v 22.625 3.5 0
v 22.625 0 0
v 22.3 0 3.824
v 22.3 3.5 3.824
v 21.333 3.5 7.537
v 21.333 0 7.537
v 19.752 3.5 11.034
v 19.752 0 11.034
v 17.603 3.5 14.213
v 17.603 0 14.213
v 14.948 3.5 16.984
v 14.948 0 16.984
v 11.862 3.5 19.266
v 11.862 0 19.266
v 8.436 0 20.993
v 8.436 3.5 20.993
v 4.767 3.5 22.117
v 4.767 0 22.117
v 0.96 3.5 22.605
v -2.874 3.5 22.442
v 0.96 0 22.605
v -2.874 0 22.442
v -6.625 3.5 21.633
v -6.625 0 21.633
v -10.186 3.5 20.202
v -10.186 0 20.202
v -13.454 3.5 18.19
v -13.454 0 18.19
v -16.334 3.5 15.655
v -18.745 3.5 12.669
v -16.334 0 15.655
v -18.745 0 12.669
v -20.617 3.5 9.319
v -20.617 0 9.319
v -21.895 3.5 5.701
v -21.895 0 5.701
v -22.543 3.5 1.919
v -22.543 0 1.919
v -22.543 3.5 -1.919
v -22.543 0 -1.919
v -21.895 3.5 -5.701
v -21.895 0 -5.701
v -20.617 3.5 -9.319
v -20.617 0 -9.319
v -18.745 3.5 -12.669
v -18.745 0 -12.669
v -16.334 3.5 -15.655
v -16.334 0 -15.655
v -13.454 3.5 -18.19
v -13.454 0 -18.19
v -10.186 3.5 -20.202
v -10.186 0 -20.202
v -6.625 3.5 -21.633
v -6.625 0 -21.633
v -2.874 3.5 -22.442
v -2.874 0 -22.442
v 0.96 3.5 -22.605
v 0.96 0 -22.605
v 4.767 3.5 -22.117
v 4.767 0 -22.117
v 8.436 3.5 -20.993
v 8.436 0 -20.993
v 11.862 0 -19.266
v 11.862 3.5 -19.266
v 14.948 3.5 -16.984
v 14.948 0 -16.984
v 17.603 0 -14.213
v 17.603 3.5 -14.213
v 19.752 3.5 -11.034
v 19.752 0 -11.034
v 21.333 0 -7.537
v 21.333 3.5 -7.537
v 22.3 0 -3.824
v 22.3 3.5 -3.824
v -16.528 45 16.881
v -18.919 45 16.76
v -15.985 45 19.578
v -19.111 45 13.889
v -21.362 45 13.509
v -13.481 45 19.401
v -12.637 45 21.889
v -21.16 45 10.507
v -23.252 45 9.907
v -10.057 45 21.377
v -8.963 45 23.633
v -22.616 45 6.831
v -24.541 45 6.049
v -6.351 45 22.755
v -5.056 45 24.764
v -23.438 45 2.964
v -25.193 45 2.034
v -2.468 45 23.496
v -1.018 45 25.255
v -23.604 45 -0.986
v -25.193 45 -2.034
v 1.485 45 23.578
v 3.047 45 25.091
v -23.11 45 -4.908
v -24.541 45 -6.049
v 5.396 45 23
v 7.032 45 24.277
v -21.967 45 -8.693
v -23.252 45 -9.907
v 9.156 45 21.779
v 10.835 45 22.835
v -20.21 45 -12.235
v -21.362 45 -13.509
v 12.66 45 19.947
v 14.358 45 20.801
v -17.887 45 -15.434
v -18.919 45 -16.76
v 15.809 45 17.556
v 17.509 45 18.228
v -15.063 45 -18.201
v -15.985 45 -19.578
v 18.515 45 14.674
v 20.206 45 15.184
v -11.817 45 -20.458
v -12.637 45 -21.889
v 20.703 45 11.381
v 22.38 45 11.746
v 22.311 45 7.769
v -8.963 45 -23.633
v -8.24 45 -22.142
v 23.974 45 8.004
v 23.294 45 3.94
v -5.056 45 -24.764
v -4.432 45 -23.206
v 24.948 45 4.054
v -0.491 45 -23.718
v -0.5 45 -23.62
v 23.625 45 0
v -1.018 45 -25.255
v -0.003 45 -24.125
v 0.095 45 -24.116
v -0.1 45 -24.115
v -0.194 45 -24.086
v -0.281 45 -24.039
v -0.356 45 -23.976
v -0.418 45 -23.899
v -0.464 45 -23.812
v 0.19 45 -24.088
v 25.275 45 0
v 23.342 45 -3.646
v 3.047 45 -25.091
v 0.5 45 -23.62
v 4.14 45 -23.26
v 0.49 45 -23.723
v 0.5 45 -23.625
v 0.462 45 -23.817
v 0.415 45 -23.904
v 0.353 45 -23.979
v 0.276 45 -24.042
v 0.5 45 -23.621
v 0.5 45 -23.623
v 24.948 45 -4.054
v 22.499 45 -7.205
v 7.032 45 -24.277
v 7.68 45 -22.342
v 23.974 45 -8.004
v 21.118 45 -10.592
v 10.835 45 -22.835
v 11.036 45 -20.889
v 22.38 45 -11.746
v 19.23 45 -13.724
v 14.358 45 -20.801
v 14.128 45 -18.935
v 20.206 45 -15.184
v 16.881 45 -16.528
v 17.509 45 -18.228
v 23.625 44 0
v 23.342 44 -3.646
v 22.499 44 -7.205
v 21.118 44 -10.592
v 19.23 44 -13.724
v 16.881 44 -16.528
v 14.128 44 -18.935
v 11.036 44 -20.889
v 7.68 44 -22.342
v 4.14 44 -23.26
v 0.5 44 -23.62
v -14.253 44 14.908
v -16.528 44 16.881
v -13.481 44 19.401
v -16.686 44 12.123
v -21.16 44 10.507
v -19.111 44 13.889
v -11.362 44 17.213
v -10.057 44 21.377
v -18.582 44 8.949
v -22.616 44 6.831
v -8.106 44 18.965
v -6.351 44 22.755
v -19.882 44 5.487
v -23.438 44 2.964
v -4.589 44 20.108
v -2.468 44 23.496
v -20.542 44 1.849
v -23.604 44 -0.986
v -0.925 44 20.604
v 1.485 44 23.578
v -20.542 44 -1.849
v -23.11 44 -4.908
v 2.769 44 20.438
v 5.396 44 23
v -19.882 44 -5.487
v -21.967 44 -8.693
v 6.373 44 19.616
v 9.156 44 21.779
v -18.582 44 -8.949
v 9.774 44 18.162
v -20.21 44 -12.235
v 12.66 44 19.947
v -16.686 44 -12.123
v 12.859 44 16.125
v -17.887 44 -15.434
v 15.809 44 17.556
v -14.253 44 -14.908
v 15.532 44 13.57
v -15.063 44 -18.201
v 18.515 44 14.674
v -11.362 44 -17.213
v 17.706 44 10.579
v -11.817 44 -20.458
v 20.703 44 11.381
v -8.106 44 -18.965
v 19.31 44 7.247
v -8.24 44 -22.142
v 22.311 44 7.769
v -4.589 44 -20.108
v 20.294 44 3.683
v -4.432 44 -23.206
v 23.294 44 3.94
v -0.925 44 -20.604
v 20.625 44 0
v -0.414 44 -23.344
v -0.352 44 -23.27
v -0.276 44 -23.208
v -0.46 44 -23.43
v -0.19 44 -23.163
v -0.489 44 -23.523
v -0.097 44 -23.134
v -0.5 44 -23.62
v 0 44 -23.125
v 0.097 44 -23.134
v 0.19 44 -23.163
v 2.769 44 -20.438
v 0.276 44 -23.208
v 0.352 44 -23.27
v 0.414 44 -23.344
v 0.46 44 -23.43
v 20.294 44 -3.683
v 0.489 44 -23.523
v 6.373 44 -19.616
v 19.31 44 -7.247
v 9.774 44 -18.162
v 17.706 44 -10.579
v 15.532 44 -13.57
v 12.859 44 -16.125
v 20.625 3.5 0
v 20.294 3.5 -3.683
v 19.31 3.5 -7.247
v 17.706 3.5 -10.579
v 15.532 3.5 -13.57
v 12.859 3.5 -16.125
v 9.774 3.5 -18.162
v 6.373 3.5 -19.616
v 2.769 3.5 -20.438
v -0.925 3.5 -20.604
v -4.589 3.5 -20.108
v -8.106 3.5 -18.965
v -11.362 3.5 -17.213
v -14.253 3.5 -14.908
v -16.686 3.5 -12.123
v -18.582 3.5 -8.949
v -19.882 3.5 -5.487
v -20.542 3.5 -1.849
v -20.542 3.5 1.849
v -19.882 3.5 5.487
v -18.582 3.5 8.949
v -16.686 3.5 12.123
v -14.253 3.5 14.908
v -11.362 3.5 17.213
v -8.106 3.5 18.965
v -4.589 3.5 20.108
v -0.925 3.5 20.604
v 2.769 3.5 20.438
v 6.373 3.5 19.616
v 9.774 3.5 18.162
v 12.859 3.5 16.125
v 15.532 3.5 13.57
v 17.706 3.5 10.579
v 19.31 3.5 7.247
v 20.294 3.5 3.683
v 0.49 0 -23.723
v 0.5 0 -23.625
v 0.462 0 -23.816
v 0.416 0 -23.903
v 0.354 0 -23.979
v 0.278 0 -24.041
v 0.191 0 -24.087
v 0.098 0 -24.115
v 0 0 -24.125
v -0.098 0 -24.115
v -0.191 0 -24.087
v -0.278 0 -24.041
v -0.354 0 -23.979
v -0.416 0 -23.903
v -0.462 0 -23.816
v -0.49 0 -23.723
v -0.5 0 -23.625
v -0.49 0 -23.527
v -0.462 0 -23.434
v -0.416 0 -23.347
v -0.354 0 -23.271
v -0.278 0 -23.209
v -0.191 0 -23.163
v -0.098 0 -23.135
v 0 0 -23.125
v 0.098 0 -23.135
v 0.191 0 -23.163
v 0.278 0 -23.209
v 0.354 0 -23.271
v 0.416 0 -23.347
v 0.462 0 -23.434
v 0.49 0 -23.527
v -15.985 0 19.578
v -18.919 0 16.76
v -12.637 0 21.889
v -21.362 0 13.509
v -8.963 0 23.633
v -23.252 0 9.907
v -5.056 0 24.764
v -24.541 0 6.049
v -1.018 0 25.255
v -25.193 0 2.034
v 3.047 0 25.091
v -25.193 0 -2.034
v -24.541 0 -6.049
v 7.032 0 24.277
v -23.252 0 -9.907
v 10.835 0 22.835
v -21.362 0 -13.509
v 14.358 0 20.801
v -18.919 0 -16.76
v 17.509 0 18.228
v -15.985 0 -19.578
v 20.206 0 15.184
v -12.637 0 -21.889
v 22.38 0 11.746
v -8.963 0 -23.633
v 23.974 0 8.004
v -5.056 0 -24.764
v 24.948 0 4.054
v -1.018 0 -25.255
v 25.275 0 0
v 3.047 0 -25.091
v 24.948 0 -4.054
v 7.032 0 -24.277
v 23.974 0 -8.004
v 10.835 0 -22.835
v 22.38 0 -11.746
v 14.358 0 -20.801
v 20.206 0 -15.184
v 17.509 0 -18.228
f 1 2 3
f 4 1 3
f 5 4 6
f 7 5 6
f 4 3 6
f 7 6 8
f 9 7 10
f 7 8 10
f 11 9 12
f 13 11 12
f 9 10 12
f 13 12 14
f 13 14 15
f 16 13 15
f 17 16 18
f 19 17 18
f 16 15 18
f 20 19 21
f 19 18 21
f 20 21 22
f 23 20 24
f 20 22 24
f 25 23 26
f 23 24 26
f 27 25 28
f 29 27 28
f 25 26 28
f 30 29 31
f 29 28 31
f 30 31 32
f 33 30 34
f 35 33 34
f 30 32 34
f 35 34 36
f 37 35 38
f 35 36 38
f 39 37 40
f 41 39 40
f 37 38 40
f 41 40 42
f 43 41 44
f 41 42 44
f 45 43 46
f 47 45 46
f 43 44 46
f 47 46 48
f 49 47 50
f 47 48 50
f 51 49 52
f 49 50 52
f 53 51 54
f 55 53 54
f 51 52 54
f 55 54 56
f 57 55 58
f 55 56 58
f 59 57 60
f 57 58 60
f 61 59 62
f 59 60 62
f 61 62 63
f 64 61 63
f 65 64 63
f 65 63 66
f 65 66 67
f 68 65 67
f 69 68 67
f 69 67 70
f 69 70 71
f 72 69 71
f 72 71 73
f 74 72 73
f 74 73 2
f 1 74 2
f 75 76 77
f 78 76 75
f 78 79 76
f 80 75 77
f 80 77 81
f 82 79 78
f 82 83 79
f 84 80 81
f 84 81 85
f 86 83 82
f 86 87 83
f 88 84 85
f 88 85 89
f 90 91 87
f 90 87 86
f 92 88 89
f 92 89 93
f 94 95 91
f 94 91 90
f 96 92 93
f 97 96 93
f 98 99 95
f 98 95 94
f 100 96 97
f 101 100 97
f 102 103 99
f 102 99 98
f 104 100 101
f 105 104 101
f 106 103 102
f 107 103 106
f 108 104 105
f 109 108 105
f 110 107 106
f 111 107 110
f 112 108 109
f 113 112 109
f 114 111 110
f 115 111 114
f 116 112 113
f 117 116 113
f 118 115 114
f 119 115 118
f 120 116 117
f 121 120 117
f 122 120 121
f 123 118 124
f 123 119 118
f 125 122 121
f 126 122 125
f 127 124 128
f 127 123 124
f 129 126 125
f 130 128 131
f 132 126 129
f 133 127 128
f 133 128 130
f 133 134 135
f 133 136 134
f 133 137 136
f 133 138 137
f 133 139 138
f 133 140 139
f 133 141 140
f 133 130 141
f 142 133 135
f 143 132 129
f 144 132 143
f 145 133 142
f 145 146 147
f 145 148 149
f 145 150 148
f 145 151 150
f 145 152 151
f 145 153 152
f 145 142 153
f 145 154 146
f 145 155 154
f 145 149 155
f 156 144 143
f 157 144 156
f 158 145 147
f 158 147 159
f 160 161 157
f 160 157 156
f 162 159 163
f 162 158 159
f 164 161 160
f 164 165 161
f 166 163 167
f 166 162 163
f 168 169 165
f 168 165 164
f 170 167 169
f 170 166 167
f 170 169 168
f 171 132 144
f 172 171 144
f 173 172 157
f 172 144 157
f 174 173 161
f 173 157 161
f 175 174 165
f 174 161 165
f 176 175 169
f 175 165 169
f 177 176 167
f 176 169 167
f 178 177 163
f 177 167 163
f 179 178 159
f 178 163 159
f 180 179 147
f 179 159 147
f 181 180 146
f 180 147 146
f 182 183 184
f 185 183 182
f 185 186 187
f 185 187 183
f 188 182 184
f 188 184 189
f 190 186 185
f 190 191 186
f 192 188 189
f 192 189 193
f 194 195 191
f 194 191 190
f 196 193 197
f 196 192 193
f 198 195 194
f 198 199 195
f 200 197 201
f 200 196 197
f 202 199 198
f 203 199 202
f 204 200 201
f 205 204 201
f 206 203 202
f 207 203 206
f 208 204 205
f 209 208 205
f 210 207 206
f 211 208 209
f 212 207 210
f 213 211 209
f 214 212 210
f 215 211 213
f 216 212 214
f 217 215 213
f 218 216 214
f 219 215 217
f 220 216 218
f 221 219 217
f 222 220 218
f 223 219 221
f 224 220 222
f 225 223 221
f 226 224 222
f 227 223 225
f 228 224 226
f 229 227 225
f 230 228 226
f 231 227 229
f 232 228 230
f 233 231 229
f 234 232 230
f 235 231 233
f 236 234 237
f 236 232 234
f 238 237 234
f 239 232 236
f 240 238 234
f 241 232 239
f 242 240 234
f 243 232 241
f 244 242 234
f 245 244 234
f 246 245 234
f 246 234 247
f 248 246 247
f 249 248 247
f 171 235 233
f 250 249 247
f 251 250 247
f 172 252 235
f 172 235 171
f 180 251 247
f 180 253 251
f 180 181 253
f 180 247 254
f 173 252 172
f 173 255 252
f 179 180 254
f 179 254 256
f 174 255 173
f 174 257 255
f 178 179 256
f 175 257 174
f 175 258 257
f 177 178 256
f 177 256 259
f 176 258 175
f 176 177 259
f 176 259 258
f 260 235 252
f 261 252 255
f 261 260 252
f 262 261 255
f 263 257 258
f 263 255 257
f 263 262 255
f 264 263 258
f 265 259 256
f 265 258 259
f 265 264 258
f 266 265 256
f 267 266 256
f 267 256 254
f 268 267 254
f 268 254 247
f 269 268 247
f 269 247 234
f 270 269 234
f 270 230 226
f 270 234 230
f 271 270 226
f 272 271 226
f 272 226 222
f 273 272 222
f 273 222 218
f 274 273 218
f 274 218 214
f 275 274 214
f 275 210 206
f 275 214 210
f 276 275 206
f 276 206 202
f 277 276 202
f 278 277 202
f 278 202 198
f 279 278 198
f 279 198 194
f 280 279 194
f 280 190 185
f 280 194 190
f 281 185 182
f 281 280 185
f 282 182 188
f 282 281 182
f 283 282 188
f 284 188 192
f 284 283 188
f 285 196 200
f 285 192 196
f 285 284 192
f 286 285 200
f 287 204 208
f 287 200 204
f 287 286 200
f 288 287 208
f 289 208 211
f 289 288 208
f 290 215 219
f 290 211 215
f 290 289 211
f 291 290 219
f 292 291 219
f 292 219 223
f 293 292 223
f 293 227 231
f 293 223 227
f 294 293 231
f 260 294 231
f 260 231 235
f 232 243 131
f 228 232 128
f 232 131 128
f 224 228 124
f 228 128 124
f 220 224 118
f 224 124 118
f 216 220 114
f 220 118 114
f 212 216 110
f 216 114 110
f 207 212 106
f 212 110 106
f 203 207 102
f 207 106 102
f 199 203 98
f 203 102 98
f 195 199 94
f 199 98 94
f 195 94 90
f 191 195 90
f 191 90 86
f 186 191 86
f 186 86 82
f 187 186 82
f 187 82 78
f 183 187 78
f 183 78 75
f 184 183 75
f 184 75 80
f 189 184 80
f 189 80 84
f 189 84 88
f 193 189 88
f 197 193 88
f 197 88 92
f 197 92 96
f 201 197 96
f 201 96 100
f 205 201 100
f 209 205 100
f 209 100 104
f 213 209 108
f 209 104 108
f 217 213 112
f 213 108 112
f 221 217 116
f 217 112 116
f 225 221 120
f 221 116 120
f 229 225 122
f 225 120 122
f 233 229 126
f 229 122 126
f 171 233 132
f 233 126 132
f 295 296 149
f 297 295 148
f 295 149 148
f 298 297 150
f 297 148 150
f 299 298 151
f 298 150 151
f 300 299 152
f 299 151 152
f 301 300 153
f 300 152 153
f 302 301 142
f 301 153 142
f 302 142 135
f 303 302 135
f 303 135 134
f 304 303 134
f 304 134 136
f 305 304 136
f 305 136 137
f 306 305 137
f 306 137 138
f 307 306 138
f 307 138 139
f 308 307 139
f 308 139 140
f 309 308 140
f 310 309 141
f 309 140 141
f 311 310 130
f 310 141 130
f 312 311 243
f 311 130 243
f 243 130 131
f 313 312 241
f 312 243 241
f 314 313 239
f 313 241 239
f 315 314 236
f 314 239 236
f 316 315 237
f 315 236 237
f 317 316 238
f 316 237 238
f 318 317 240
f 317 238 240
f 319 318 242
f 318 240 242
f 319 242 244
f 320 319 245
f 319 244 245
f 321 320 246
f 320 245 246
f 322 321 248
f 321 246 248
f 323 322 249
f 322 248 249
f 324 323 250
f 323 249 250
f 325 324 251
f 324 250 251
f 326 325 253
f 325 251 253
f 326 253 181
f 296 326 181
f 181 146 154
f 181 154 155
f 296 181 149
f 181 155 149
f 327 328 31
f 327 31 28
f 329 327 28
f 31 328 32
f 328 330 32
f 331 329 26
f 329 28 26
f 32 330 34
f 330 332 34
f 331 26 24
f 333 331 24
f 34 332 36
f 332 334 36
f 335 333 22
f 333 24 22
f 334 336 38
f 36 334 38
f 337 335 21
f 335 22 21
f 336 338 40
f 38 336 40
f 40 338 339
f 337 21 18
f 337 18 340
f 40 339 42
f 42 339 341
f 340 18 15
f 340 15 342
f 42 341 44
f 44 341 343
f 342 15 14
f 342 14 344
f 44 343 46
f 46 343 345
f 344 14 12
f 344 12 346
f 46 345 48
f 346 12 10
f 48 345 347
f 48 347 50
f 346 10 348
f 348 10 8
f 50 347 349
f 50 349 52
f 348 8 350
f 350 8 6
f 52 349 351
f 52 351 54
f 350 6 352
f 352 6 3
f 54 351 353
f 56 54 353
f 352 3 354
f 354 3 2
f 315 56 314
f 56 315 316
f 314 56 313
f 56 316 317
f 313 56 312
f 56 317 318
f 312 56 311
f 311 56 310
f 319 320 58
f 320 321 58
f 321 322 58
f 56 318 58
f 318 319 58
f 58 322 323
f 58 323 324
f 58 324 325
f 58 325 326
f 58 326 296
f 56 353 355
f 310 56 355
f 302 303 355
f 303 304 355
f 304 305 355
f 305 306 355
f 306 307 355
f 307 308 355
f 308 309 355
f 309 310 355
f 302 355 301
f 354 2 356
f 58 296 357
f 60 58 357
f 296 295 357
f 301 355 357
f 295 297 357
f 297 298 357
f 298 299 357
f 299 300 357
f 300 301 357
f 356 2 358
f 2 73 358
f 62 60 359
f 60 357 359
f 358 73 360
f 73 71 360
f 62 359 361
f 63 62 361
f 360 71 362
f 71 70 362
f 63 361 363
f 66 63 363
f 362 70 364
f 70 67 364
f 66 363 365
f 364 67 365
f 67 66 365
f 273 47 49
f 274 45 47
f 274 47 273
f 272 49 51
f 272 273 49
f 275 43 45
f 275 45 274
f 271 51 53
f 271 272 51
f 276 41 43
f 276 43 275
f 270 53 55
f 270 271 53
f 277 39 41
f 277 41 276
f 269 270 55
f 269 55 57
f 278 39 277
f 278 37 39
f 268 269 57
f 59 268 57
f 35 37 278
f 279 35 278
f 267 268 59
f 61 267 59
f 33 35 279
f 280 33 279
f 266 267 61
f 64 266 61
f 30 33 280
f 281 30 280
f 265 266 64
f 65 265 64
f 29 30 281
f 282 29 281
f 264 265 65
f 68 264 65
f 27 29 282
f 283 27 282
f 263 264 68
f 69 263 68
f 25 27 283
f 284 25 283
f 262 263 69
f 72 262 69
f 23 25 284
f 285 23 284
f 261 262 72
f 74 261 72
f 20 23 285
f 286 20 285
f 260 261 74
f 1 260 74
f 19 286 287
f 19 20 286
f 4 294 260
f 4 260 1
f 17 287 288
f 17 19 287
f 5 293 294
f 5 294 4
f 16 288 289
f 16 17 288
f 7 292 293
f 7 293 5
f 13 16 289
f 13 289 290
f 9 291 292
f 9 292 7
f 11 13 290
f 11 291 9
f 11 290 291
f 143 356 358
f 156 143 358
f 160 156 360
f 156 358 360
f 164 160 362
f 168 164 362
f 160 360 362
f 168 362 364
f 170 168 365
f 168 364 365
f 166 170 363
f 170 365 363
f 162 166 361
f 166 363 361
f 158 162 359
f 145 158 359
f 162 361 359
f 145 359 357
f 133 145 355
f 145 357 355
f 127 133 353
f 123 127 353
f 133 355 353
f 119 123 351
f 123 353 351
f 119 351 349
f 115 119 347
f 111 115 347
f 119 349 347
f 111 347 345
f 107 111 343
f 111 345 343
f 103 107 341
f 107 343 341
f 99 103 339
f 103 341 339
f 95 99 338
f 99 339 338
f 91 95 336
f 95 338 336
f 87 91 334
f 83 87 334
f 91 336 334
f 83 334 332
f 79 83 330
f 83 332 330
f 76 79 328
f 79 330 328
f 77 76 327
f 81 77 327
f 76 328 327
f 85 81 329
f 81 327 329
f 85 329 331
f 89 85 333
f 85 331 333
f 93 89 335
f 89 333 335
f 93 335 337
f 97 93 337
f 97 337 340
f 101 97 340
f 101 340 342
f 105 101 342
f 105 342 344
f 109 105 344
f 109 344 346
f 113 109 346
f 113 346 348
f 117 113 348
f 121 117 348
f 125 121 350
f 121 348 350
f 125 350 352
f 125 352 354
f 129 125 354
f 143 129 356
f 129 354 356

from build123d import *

# Parameters (mm, degrees)
SKETCH1_R           = 25.275
SKETCH1_R_2         = 20.625
BOSS_EXTRUDE1_DEPTH = 45
SKETCH2_R           = 22.625
CUT_EXTRUDE1_DEPTH  = 3.5
SKETCH3_R           = 23.625
CUT_EXTRUDE2_DEPTH  = 1
SKETCH4_R           = 0.5
CUT_EXTRUDE3_DEPTH  = 47.5


with BuildPart() as part:
    # Sketch1 → Boss-Extrude1 (new body)
    with BuildSketch(Plane(origin=(0, 0, 0), x_dir=(1, 0, 0), z_dir=(0, 1, 0))):
        Circle(SKETCH1_R)
        Circle(SKETCH1_R_2, mode=Mode.SUBTRACT)
    extrude(amount=BOSS_EXTRUDE1_DEPTH)

    # Sketch2 → Cut-Extrude1 (cut)
    with BuildSketch(Plane.XZ):
        Circle(SKETCH2_R)
    extrude(amount=-CUT_EXTRUDE1_DEPTH, mode=Mode.SUBTRACT)

    # Sketch3 → Cut-Extrude2 (cut)
    with BuildSketch(Plane(origin=(0, 45, 0), x_dir=(1, 0, 0), z_dir=(0, 1, 0))):
        Circle(SKETCH3_R)
    extrude(amount=-CUT_EXTRUDE2_DEPTH, mode=Mode.SUBTRACT)

    # Sketch4 → Cut-Extrude3 (cut)
    with BuildSketch(Plane(origin=(0, 45, 0), x_dir=(1, 0, 0), z_dir=(0, 1, 0))):
        with Locations((0, 23.625)):
            Circle(SKETCH4_R)
    extrude(amount=-CUT_EXTRUDE3_DEPTH, mode=Mode.SUBTRACT)


solid = part.part
